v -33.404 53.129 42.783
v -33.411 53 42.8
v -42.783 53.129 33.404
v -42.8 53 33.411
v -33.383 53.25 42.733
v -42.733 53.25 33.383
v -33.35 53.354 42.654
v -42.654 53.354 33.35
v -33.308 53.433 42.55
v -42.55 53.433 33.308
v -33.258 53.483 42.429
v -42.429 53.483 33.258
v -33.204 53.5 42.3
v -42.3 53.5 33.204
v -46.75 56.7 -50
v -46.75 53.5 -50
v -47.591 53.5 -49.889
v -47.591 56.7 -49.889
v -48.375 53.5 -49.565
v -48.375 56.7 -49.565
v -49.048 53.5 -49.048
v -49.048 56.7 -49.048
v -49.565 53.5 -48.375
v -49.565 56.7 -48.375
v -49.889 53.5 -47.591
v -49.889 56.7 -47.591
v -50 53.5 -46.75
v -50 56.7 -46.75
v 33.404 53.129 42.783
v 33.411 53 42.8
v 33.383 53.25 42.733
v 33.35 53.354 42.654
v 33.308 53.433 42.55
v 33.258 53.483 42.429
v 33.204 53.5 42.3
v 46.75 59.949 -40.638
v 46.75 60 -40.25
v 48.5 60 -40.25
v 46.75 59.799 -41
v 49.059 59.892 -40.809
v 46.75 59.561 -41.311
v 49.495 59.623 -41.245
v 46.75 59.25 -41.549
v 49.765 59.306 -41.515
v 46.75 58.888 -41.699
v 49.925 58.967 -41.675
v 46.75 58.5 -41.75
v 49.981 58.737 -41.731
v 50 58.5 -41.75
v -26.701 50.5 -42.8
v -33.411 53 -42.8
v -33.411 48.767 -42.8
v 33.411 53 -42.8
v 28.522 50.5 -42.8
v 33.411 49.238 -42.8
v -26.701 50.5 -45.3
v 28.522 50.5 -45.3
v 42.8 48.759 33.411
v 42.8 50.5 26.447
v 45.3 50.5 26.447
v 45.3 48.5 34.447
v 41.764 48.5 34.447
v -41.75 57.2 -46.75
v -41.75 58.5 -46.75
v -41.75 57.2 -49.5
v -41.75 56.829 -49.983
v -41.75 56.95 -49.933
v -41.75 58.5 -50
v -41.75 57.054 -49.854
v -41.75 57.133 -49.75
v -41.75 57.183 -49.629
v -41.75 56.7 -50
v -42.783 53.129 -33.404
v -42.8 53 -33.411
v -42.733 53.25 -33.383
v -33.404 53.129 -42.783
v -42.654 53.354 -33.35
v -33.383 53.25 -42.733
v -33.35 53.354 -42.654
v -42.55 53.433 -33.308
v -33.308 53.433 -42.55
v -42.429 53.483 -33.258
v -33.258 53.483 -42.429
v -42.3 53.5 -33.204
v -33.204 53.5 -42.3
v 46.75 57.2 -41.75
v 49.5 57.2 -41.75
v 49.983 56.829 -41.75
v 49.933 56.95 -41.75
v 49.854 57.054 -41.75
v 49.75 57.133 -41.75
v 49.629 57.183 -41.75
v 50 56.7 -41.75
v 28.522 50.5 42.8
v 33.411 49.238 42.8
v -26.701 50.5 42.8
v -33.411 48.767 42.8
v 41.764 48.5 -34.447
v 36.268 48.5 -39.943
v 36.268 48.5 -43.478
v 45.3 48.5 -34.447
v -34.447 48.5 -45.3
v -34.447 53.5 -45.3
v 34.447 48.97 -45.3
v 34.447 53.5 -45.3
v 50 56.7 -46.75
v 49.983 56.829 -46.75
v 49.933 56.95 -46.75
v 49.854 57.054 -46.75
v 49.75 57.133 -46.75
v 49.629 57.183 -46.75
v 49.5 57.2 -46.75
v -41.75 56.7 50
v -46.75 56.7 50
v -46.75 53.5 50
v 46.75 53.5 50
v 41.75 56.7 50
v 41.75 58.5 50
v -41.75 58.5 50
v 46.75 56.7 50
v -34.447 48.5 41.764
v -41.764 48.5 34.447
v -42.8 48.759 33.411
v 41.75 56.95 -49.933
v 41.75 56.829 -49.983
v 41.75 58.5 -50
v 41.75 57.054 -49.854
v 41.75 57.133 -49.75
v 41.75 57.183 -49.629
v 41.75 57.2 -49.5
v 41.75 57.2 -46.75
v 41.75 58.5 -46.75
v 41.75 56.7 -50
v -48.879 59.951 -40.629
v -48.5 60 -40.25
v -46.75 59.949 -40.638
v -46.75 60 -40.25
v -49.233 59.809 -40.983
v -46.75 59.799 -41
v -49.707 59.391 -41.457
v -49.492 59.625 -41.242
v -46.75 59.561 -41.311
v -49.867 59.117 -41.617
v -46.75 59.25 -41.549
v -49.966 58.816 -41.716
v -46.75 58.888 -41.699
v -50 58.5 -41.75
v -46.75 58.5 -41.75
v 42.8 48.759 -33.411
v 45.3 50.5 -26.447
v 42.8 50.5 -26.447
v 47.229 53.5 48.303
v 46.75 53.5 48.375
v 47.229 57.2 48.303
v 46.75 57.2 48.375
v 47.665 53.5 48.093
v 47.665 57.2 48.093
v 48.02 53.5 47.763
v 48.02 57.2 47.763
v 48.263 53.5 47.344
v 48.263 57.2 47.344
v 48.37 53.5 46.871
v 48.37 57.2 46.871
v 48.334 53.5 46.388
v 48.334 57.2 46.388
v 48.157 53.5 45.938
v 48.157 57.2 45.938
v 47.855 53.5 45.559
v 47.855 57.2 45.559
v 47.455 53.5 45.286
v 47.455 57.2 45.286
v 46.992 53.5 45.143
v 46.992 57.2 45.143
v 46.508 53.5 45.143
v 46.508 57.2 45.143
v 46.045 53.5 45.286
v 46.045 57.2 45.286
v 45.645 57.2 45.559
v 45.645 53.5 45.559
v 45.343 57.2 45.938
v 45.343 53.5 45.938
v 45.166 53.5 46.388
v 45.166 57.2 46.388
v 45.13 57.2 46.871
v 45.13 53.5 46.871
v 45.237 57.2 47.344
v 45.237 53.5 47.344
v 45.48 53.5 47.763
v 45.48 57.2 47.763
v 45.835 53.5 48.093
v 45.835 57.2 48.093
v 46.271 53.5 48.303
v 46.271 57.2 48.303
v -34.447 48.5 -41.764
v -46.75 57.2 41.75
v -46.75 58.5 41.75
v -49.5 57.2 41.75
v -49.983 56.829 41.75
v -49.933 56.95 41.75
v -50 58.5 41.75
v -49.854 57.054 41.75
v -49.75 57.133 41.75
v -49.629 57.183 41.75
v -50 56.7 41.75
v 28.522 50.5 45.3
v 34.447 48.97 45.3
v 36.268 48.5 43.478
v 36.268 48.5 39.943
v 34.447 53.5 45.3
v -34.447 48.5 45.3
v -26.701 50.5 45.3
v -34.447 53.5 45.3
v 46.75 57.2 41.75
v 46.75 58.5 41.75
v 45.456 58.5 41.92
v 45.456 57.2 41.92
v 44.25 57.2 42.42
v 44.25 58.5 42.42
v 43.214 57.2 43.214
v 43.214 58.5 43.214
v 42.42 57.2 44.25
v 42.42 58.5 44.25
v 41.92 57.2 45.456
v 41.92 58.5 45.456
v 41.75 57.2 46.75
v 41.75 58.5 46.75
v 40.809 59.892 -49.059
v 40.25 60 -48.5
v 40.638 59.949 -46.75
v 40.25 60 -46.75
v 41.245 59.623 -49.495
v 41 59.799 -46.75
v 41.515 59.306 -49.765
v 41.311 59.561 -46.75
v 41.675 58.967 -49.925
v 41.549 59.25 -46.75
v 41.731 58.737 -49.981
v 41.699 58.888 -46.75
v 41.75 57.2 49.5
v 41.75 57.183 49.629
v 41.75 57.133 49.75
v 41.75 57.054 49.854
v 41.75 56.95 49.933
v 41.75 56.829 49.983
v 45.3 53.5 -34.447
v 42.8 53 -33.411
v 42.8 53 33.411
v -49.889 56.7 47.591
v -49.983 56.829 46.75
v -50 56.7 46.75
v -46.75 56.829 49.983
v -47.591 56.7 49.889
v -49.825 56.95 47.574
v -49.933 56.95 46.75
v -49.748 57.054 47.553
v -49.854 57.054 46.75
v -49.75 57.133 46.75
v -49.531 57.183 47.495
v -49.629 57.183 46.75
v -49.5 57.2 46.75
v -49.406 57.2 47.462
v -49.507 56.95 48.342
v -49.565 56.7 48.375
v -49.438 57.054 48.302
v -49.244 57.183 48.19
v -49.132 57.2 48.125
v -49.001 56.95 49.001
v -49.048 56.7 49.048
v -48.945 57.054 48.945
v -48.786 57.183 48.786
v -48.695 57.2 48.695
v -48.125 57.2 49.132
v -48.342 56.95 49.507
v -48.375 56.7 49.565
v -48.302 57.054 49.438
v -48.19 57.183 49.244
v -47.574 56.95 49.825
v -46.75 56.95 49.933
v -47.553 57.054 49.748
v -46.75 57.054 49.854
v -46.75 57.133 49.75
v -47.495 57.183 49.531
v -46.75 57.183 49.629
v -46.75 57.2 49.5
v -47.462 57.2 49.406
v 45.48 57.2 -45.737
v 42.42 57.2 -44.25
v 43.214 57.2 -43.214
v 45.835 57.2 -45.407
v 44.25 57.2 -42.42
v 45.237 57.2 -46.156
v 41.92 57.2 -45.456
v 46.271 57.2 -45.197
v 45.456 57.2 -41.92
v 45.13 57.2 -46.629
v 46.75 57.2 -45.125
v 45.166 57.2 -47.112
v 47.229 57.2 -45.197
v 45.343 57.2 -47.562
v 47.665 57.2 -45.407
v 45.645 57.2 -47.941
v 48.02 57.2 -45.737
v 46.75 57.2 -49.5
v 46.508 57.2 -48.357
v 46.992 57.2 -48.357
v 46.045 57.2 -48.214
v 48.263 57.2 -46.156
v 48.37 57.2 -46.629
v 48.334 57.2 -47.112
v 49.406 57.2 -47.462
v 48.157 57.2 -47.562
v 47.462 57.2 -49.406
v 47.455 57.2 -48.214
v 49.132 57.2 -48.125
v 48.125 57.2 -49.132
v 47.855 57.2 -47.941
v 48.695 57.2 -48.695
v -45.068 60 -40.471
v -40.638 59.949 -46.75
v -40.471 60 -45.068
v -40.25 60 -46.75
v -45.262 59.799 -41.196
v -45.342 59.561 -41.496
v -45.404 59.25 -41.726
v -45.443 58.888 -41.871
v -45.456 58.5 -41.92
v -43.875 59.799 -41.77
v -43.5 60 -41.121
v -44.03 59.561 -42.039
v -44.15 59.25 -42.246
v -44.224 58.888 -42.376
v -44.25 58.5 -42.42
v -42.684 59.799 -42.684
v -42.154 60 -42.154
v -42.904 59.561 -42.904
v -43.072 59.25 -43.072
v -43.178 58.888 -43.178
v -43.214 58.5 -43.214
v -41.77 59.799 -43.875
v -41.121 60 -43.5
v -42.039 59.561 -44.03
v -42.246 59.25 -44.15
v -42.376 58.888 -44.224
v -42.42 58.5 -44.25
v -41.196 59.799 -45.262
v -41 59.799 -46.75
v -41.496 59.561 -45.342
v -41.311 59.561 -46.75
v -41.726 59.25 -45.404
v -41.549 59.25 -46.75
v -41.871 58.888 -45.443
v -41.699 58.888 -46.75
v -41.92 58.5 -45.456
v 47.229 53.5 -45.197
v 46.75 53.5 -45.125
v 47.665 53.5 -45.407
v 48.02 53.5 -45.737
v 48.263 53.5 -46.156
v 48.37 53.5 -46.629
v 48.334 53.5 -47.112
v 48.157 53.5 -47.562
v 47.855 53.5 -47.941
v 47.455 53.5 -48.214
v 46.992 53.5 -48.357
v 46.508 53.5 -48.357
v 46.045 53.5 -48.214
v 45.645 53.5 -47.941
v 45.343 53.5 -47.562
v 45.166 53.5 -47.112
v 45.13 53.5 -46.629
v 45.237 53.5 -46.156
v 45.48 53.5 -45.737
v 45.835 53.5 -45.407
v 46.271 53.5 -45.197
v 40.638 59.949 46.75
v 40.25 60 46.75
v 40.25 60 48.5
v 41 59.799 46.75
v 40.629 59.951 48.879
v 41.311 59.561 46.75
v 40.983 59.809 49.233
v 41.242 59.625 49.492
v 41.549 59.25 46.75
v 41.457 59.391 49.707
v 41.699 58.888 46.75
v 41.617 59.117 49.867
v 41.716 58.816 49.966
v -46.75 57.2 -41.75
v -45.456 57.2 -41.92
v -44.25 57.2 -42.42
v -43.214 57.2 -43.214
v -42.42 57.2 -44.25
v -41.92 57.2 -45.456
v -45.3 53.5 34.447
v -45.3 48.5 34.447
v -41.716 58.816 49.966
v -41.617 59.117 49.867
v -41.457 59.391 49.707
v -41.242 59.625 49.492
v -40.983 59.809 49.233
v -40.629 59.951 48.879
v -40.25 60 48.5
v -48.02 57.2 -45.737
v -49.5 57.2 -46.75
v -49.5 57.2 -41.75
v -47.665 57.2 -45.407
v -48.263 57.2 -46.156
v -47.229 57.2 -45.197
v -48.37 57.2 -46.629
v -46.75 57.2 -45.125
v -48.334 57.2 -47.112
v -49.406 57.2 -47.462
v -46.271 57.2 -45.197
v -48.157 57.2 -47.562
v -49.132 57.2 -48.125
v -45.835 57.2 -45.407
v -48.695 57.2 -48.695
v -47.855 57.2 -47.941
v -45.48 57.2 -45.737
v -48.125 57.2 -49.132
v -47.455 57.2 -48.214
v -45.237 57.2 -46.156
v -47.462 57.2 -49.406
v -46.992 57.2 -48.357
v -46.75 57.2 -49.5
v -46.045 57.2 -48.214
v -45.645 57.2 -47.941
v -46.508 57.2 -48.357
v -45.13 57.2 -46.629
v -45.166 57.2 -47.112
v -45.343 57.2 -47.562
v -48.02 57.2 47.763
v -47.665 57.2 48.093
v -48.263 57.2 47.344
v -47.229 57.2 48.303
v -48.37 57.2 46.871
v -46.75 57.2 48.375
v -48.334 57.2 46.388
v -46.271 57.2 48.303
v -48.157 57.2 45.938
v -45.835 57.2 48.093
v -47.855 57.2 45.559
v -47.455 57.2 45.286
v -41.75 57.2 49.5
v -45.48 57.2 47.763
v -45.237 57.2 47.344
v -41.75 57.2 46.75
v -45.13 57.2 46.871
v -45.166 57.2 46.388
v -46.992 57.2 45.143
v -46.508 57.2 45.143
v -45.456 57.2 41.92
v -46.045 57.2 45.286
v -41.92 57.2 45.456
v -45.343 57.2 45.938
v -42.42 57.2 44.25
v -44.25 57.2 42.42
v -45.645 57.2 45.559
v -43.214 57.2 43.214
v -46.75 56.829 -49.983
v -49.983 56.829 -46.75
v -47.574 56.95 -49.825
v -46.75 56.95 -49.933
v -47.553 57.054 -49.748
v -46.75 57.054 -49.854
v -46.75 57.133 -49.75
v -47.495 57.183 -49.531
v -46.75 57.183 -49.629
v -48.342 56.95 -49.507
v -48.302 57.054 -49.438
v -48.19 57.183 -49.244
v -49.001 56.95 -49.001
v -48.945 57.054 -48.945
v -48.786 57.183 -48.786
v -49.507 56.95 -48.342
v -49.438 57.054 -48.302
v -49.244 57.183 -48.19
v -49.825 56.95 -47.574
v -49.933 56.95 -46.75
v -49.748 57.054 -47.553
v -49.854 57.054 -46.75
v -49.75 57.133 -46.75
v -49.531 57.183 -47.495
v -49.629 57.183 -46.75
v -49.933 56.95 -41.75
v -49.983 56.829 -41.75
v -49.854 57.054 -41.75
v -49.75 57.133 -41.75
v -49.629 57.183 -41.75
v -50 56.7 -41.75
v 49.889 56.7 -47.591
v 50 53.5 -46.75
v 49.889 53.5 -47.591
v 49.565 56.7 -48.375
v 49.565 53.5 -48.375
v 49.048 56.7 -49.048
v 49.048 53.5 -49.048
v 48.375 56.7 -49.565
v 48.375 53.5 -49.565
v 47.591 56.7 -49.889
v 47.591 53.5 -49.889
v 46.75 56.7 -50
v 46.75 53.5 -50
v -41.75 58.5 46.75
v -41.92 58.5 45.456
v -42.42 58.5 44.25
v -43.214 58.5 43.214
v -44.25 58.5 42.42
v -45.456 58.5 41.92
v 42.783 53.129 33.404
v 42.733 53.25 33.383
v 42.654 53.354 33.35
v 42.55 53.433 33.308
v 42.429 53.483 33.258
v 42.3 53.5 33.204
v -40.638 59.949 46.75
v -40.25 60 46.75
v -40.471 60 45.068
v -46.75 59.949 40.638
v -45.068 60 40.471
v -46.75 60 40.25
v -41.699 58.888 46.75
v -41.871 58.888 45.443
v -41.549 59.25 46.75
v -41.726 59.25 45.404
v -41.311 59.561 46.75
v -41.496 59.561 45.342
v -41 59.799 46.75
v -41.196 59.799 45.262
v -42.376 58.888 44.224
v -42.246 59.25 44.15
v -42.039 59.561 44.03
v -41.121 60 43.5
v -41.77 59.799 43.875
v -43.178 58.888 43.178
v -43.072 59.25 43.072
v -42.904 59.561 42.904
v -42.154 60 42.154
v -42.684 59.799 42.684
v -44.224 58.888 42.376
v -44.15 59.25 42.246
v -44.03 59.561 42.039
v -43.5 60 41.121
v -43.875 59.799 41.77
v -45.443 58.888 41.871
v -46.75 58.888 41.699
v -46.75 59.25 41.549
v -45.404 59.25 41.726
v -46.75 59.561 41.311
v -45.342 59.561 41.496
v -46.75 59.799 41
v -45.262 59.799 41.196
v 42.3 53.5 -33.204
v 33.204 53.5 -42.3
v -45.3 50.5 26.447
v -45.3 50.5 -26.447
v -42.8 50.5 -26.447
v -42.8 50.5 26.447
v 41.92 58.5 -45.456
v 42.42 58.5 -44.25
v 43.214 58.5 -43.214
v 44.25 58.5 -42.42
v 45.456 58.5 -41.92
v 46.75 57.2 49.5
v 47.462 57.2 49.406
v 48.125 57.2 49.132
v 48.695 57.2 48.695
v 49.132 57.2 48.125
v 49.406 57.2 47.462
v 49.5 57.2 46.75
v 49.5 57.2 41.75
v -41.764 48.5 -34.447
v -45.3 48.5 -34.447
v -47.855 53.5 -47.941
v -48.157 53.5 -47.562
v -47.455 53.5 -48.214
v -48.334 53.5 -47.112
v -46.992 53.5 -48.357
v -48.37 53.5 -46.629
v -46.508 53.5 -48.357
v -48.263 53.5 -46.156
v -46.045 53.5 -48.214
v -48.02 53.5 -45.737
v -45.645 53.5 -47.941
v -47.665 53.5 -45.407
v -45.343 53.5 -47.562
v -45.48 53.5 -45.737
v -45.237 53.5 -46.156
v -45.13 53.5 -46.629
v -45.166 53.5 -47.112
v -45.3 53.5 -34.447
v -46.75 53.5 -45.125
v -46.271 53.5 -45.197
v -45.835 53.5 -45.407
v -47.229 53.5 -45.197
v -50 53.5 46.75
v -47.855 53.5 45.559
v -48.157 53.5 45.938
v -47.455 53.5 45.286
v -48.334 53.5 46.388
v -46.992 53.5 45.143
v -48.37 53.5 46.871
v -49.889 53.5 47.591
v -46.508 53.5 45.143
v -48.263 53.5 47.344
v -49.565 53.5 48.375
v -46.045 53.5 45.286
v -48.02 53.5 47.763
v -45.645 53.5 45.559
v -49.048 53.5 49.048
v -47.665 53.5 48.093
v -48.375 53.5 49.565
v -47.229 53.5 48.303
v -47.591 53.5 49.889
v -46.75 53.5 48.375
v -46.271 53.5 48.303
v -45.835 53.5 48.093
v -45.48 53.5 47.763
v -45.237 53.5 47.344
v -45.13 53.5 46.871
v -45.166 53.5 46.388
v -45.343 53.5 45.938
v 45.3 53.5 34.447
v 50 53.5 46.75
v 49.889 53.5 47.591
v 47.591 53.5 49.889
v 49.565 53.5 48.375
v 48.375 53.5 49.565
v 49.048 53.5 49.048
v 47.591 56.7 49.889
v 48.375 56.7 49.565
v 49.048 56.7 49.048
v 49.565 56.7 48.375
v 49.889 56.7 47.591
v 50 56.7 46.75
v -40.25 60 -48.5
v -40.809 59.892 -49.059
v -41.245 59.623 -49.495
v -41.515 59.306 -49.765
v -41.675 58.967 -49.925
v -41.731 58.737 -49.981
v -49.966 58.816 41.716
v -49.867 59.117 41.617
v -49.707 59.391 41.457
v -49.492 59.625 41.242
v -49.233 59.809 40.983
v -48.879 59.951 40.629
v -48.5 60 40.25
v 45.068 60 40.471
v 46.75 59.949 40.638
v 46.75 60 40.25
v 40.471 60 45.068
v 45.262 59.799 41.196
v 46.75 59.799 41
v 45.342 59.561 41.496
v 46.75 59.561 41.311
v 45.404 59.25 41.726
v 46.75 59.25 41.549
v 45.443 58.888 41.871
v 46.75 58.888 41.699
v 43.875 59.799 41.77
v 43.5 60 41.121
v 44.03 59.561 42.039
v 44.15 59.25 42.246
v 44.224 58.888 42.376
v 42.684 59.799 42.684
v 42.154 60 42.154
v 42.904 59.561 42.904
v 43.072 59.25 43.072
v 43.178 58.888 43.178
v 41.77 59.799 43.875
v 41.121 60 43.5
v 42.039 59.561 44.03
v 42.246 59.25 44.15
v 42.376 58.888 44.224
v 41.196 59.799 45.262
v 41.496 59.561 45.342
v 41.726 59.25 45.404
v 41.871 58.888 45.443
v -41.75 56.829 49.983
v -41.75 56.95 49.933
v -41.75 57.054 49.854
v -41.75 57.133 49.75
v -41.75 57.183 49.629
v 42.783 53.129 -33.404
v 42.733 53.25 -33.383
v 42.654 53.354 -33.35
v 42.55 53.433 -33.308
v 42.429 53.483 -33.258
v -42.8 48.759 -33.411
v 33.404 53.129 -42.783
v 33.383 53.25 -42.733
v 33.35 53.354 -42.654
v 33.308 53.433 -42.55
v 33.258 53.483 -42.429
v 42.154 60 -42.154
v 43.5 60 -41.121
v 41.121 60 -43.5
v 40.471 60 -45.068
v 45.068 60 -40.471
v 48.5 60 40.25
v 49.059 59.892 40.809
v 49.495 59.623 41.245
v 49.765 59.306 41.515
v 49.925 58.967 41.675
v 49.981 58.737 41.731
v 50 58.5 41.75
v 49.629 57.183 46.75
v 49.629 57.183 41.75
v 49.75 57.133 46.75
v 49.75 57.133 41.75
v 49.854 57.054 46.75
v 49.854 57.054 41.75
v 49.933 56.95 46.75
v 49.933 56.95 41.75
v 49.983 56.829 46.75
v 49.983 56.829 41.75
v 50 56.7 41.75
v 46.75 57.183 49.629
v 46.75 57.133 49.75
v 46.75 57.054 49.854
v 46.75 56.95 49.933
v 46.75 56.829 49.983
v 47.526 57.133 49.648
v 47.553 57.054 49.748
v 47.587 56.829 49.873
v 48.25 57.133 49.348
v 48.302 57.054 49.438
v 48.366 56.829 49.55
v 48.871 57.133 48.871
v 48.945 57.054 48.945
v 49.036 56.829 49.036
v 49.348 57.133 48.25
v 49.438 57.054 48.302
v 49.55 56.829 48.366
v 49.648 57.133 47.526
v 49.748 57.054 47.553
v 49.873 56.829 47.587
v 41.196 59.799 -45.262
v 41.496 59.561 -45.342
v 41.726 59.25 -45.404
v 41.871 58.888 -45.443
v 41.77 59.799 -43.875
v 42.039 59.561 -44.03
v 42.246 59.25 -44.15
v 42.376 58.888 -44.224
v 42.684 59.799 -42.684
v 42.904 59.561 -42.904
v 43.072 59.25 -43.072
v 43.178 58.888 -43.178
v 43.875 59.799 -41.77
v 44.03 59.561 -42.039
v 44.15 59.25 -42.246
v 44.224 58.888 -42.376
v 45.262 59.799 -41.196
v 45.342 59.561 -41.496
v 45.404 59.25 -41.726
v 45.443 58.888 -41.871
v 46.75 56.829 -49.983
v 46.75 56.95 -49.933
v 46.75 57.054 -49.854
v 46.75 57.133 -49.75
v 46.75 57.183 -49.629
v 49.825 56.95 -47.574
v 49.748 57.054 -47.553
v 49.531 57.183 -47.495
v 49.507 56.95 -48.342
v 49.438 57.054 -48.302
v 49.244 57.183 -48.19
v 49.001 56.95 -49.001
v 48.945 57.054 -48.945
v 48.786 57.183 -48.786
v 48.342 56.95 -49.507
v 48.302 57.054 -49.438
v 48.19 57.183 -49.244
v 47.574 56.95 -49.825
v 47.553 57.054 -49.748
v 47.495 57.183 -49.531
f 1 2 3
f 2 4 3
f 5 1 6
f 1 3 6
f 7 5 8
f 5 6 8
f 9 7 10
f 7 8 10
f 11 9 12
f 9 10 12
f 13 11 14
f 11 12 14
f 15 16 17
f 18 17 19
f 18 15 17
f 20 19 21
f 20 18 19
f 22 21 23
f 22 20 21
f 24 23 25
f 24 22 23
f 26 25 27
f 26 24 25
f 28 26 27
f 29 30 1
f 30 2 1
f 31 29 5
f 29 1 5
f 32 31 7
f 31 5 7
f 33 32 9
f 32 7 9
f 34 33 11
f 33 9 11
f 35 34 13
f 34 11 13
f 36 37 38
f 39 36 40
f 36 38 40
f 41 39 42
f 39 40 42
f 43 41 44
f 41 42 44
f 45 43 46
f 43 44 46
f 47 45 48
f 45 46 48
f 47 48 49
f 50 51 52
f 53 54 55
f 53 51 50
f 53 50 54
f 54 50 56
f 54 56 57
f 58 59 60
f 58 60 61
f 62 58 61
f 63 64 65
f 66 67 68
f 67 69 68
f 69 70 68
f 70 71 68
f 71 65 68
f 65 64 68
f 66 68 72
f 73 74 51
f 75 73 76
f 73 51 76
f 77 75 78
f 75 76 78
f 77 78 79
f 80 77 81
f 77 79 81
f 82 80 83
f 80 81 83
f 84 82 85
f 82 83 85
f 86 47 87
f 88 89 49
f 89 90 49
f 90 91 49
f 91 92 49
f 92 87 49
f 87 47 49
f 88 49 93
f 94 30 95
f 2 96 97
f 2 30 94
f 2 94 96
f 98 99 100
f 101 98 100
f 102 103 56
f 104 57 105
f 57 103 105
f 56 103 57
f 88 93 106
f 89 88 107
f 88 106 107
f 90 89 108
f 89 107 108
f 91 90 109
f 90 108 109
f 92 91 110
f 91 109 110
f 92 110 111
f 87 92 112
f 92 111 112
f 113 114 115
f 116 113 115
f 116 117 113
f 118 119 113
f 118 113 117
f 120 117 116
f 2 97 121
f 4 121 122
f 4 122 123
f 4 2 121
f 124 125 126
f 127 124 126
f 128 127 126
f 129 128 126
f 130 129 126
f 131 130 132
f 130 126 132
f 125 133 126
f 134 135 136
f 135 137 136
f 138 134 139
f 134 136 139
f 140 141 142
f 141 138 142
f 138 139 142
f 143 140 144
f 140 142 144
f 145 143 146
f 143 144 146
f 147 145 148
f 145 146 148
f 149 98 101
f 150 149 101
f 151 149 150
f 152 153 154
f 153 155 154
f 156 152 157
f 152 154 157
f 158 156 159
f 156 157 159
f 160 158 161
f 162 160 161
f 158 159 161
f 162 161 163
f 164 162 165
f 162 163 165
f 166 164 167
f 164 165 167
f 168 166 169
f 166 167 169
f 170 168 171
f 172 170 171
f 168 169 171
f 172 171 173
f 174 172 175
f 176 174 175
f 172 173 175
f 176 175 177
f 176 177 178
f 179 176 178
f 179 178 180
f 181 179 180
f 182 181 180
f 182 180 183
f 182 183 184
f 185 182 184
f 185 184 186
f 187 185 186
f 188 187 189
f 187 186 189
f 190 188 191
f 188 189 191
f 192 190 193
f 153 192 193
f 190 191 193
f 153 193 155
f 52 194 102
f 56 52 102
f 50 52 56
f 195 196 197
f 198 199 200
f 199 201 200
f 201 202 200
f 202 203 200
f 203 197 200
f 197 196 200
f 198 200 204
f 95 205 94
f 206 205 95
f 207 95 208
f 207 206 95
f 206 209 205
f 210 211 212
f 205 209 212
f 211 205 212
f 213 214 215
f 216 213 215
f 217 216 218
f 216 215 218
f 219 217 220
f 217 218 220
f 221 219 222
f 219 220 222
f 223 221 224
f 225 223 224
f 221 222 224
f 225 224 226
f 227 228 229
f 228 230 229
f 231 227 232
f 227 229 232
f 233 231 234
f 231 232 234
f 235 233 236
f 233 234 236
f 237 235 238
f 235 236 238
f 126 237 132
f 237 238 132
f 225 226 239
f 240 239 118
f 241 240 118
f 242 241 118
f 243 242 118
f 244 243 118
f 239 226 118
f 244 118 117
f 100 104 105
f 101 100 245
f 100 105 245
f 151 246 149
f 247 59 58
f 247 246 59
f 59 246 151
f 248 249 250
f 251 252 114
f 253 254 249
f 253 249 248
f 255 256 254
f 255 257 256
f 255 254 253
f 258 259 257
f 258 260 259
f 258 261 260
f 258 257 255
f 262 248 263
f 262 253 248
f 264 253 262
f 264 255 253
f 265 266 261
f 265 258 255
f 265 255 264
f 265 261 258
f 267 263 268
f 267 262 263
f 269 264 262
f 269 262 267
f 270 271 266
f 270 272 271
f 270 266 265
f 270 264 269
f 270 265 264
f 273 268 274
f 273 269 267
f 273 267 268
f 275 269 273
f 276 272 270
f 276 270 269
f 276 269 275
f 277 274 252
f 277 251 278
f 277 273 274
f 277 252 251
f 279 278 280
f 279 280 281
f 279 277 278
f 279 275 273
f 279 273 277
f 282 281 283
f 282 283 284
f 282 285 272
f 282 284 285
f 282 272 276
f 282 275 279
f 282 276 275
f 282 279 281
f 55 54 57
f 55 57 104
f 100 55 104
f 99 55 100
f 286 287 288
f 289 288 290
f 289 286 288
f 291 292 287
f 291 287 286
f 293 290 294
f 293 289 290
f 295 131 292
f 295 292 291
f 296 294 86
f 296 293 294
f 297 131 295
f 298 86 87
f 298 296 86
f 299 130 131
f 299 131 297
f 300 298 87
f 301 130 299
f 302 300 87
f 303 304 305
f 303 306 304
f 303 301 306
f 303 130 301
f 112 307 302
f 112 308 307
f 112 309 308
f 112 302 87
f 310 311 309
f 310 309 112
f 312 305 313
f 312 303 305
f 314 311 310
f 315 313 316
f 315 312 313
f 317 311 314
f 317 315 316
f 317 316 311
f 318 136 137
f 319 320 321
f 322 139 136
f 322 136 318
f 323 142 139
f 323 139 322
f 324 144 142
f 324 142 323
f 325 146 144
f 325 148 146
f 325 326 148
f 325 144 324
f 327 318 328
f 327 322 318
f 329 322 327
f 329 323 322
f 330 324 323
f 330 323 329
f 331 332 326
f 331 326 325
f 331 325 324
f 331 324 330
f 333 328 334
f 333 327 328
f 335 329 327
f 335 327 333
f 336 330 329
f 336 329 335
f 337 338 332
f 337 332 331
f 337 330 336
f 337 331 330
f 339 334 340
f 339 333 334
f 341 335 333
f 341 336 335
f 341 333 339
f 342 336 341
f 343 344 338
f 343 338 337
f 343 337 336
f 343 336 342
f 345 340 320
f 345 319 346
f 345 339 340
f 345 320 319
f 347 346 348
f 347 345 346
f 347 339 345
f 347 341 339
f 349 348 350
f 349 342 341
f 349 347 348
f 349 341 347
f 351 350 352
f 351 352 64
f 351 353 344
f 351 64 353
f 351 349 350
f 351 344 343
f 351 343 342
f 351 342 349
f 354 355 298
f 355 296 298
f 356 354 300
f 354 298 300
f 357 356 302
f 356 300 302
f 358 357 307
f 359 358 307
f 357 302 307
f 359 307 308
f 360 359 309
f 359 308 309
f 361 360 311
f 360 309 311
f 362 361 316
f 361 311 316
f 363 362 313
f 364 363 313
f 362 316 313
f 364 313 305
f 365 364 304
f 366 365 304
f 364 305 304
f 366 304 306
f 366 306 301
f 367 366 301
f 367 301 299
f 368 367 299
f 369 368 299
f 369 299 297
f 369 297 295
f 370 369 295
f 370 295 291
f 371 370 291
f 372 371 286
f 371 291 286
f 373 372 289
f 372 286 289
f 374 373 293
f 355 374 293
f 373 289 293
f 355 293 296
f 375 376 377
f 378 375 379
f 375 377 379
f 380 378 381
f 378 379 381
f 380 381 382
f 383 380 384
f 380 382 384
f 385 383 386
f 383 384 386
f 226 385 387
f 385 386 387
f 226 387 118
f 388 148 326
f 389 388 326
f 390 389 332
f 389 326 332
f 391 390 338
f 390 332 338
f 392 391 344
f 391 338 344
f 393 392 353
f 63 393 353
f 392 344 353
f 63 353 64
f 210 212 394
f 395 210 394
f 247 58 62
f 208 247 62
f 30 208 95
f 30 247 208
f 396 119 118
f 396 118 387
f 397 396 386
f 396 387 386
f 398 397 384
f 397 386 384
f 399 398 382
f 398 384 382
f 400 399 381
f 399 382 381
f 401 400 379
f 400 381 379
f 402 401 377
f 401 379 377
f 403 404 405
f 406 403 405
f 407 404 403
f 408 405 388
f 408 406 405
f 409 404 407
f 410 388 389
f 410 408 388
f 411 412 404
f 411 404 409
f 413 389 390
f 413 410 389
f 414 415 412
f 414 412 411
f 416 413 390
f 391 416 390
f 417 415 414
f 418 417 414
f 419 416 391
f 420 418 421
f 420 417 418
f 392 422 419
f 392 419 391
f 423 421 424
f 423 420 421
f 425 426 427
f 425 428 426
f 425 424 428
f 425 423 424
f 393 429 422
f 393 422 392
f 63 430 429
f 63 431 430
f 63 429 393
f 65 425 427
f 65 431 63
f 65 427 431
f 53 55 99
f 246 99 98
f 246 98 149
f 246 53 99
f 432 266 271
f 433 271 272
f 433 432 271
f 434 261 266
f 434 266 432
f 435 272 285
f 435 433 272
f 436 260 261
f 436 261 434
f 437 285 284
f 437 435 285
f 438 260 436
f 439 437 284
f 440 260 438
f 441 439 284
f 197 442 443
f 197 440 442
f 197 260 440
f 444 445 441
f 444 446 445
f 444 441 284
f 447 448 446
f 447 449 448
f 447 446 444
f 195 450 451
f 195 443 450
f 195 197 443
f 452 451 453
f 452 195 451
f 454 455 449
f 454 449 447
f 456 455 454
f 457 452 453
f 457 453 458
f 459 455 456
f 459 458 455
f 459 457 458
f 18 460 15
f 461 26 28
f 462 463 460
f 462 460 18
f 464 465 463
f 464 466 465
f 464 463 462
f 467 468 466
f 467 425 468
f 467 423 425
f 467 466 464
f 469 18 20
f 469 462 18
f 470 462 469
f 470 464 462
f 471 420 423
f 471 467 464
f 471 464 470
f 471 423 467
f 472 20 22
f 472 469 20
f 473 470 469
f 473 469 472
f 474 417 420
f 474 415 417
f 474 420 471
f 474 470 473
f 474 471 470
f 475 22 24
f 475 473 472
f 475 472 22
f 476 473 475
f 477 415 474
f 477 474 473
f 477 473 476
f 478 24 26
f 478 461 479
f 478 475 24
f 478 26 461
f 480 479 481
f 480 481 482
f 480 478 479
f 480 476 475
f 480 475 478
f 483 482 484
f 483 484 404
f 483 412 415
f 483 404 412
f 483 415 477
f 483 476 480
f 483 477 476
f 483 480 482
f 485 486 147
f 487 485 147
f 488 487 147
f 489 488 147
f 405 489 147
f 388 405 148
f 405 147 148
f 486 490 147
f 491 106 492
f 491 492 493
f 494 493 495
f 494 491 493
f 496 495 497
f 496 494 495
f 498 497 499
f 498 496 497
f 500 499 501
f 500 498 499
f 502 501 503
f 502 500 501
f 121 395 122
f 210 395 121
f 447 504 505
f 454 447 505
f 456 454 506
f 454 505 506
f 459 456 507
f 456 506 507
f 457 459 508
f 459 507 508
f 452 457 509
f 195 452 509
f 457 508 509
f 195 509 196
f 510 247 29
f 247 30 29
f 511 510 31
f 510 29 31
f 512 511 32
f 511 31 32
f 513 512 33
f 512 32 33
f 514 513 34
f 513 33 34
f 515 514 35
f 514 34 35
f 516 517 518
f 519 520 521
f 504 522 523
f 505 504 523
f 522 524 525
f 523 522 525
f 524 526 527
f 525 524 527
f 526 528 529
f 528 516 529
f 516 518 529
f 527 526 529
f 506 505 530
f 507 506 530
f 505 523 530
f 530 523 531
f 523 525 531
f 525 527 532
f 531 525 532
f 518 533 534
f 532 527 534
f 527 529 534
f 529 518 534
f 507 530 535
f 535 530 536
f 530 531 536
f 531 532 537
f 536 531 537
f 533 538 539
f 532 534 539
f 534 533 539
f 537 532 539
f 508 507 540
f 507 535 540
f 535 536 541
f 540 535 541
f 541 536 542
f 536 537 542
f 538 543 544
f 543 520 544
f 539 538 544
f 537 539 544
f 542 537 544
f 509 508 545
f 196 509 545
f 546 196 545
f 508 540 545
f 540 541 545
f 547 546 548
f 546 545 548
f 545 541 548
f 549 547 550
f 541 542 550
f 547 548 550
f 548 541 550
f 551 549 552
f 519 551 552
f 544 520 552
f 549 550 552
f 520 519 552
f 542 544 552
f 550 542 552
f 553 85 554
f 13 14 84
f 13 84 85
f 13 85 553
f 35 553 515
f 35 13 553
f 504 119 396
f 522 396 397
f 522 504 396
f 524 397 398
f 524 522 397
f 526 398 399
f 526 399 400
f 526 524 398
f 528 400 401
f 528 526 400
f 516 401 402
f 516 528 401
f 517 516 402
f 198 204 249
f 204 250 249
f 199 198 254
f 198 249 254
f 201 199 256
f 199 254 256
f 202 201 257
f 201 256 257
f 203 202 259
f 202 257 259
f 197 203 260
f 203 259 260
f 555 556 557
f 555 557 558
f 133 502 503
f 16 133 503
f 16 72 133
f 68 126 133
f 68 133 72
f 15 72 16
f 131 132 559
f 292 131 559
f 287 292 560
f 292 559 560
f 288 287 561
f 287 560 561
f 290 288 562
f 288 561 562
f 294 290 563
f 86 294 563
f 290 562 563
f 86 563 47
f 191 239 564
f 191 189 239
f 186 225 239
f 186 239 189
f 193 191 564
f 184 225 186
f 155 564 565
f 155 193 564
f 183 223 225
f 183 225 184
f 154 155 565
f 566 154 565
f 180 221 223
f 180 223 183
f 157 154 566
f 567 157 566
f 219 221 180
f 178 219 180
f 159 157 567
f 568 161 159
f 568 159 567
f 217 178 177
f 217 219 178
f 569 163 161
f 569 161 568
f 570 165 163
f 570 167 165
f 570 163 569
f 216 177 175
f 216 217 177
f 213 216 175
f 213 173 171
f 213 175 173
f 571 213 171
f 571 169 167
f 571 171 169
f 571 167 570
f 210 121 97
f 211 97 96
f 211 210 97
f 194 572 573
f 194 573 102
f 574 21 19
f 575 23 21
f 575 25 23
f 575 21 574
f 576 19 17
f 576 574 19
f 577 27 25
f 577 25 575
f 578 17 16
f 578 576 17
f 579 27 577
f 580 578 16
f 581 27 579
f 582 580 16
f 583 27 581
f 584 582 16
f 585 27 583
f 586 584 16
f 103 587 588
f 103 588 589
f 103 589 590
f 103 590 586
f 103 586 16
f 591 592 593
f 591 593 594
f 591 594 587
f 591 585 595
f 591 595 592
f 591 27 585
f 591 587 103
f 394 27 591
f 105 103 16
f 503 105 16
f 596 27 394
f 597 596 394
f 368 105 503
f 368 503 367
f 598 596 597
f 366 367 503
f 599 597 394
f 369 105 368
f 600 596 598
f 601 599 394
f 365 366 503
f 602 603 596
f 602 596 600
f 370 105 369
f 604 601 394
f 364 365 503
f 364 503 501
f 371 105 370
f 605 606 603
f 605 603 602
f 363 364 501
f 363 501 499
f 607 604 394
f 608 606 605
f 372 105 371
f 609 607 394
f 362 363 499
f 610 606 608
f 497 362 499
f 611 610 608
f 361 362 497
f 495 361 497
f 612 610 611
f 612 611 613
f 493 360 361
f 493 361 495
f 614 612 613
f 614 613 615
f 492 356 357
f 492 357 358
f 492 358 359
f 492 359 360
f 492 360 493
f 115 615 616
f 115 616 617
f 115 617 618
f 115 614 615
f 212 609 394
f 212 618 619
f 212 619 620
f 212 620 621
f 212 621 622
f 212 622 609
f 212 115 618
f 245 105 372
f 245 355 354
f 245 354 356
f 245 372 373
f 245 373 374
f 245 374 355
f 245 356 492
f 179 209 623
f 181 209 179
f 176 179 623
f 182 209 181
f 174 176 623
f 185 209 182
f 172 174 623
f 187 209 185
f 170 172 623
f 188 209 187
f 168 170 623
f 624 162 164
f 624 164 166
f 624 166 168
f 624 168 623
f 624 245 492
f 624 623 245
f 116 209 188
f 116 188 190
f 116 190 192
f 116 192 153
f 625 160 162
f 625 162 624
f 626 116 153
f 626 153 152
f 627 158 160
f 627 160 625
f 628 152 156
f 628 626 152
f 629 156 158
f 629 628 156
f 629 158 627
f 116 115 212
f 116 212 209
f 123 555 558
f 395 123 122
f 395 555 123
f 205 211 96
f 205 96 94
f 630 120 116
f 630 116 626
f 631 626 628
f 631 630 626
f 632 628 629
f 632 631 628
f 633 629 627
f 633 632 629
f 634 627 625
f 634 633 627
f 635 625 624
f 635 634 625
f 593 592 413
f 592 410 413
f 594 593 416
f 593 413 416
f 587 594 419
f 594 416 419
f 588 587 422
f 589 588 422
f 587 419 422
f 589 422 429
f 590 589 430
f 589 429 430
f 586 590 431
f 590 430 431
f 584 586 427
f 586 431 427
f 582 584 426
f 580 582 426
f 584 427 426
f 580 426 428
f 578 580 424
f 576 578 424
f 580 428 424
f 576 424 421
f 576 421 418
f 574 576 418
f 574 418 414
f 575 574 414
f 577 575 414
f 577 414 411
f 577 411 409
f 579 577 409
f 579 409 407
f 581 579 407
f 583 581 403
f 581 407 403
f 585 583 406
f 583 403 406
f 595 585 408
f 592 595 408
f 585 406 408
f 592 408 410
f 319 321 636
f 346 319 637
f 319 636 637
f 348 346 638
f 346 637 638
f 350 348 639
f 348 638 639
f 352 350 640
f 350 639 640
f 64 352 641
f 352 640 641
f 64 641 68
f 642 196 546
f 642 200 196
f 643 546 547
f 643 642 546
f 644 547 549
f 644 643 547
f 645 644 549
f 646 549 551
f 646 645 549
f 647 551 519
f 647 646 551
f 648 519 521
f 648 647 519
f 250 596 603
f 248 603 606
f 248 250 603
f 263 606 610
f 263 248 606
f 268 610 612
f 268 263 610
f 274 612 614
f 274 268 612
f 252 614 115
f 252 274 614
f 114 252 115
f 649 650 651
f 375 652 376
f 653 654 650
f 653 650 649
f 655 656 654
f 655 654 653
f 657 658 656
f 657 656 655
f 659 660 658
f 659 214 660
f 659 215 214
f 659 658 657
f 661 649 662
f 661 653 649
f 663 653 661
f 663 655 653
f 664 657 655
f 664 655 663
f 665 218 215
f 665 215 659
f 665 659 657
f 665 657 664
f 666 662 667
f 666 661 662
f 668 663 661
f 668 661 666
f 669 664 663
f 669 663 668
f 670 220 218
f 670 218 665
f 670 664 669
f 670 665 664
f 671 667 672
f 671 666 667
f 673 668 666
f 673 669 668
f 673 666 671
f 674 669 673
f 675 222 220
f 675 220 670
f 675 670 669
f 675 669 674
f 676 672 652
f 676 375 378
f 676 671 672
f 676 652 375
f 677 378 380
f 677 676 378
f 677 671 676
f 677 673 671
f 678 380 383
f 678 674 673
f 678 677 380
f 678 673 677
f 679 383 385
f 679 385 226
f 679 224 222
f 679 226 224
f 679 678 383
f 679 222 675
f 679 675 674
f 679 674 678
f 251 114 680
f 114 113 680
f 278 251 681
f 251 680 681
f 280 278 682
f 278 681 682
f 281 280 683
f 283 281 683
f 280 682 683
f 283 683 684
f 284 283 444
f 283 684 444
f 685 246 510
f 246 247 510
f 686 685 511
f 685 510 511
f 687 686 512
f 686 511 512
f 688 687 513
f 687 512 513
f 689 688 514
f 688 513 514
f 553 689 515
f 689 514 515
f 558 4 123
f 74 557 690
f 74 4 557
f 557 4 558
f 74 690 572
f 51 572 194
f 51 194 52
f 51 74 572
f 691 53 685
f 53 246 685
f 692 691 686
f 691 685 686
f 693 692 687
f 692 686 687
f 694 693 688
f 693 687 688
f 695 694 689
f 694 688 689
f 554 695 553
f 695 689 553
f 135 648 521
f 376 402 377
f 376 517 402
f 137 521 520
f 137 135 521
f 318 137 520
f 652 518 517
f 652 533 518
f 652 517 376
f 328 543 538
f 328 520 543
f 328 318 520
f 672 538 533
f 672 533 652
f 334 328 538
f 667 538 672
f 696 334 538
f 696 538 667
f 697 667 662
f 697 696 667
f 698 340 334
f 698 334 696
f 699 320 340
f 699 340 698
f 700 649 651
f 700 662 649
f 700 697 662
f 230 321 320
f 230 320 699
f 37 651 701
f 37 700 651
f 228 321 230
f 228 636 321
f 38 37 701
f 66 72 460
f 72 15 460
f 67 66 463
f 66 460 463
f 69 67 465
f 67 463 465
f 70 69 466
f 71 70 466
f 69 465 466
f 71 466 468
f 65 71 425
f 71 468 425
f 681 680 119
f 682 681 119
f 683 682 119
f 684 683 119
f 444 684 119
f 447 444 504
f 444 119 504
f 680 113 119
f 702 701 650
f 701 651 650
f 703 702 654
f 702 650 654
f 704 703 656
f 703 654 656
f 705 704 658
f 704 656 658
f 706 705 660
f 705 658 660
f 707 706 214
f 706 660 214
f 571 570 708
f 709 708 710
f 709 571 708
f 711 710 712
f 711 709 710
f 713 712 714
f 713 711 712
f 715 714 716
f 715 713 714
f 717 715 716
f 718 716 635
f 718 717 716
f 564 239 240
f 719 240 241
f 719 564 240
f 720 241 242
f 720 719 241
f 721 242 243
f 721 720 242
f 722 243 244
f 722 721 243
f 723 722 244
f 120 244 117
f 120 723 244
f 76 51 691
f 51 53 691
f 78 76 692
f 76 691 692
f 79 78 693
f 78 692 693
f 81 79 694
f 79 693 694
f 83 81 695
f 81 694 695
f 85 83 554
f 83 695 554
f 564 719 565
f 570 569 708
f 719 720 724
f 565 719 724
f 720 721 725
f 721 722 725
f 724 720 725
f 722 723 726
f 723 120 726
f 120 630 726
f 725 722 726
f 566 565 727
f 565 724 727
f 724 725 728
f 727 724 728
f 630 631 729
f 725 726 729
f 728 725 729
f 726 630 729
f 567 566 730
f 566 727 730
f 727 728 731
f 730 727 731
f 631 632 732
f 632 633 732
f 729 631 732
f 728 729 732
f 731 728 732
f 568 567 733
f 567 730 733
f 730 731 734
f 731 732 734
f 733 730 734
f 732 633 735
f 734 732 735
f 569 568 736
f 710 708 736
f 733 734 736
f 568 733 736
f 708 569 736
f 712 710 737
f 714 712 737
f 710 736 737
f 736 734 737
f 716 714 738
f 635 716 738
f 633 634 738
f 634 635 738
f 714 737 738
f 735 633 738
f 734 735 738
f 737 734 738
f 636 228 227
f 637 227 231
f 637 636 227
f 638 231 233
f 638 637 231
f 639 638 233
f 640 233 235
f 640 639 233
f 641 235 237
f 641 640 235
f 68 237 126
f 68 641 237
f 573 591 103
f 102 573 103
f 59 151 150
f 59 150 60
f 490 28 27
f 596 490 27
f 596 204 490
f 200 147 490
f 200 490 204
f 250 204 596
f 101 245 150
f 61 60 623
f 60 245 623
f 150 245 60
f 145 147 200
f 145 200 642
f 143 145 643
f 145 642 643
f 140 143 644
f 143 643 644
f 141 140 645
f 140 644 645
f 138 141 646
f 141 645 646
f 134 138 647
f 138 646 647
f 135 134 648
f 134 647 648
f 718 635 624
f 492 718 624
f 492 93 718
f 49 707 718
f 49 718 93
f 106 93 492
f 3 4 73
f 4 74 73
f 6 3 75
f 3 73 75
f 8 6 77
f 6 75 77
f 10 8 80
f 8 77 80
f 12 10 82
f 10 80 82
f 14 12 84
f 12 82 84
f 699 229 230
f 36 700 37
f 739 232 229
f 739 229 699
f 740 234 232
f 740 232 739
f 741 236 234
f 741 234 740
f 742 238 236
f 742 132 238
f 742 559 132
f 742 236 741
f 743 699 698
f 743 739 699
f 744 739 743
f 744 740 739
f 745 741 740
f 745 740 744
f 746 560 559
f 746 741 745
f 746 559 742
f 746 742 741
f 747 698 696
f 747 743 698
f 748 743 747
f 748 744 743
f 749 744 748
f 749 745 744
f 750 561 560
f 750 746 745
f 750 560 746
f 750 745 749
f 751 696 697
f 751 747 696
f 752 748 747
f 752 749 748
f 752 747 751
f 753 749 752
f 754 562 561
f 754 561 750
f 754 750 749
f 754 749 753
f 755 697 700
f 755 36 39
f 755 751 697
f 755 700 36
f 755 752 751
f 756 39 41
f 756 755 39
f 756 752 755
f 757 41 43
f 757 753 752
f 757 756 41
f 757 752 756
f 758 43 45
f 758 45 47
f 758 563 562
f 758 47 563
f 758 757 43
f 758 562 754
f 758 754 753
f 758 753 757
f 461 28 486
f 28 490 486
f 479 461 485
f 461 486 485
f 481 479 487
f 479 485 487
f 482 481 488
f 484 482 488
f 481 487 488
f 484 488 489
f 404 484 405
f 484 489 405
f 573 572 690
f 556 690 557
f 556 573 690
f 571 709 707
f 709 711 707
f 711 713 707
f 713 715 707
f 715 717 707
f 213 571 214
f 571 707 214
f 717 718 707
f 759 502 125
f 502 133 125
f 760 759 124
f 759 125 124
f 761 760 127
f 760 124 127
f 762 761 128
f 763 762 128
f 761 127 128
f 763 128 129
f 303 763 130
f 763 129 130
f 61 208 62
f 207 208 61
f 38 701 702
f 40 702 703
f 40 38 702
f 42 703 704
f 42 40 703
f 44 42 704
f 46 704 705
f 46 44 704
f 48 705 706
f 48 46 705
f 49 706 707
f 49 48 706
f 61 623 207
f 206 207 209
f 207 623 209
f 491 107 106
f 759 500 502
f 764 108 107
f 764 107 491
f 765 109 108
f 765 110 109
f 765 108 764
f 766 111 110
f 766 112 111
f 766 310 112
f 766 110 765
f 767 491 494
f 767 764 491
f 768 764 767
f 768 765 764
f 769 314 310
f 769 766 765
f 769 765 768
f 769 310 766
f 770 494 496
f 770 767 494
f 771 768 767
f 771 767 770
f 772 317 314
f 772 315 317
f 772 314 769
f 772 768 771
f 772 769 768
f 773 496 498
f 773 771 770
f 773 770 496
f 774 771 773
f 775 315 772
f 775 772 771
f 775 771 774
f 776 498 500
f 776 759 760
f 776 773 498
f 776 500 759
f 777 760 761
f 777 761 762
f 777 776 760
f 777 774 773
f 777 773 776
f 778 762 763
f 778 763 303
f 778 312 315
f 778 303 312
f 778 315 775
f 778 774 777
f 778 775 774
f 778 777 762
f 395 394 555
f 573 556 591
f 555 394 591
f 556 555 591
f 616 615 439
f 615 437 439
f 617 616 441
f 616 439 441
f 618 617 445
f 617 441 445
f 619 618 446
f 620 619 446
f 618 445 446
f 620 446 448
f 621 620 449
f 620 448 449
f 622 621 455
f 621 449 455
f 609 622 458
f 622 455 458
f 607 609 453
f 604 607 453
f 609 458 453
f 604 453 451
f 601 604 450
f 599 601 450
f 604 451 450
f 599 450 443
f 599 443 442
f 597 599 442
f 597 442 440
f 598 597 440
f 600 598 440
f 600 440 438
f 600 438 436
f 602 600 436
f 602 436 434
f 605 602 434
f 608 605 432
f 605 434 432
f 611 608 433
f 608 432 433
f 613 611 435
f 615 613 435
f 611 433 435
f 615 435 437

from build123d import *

# Parameters (mm, degrees)
SKETCH1_W           = 100
SKETCH1_H           = 100
BOSS_EXTRUDE1_DEPTH = 53.5
SKETCH2_R           = 2.5
SKETCH2_W           = 12.6
SKETCH2_H           = 3.072407599
BOSS_EXTRUDE2_DEPTH = 4
CUT_EXTRUDE1_DEPTH  = 47.5
FILLET1_R           = 3.25
FILLET2_R           = 3
SKETCH4_R           = 1.625
CUT_EXTRUDE2_DEPTH  = 14
FILLET3_R           = 3
BOSS_EXTRUDE3_START = 6.5
SKETCH8_R           = 1.625
BOSS_EXTRUDE3_DEPTH = 6.5
SKETCH10_W          = 159.412029064
SKETCH10_H          = 131.965012122
CUT_EXTRUDE3_DEPTH  = 205.5
SKETCH11_R          = 1.625
CUT_EXTRUDE4_DEPTH  = 2.8
FILLET4_R           = 1.5
FILLET5_R           = 0.5
BOSS_EXTRUDE4_DEPTH = 5
FILLET6_R           = 0.5
CUT_EXTRUDE5_DEPTH  = 130
CUT_EXTRUDE6_DEPTH  = 130


with BuildPart() as part:
    # Sketch1 → Boss-Extrude1 (new body)
    with BuildSketch(Plane(origin=(0, 0, 0), x_dir=(1, 0, 0), z_dir=(0, 1, 0))):
        Rectangle(SKETCH1_W, SKETCH1_H)
    extrude(amount=BOSS_EXTRUDE1_DEPTH)

    # Sketch2 → Boss-Extrude2 (add)
    # profile 1 of 8: a face of its own
    with BuildSketch(Plane.XZ):
        with BuildLine():
            Line((33.15, -50), (20.55, -50))
            Line((20.55, -50), (20.55, -56.973787721))
            ThreePointArc((20.55, -56.973787721), (26.85, -63.273787721), (33.15, -56.973787721))
            Line((33.15, -56.973787721), (33.15, -50))
        make_face()
        with Locations(Location((26.85, -56.973787721, 0), (0, 0, 270))):
            Circle(SKETCH2_R, mode=Mode.SUBTRACT)
    # profile 2 of 8: a face of its own
    with BuildSketch(Plane.XZ):
        with BuildLine():
            Line((-20.55, -56.973787721), (-20.55, -50))
            Line((-20.55, -50), (-33.15, -50))
            Line((-33.15, -50), (-33.15, -56.973787721))
            ThreePointArc((-33.15, -56.973787721), (-26.85, -63.273787721), (-20.55, -56.973787721))
        make_face()
        with Locations(Location((-26.85, -56.973787721, 0), (0, 0, 270))):
            Circle(SKETCH2_R, mode=Mode.SUBTRACT)
    # profile 3 of 8: a face of its own
    with BuildSketch(Plane.XZ):
        with Locations((-26.85, 48.4637962)):
            Rectangle(SKETCH2_W, SKETCH2_H)
    # profile 4 of 8: a face of its own
    with BuildSketch(Plane.XZ):
        with BuildLine():
            Line((-33.15, 50), (-20.55, 50))
            Line((-20.55, 50), (-20.55, 56.973787721))
            ThreePointArc((-20.55, 56.973787721), (-26.85, 63.273787721), (-33.15, 56.973787721))
            Line((-33.15, 56.973787721), (-33.15, 50))
        make_face()
        with Locations(Location((-26.85, 56.973787721, 0), (0, 0, 270))):
            Circle(SKETCH2_R, mode=Mode.SUBTRACT)
    # profile 5 of 8: a face of its own
    with BuildSketch(Plane.XZ):
        with BuildLine():
            Line((20.55, 56.973787721), (20.55, 50))
            Line((20.55, 50), (33.15, 50))
            Line((33.15, 50), (33.15, 56.973787721))
            ThreePointArc((33.15, 56.973787721), (26.85, 63.273787721), (20.55, 56.973787721))
        make_face()
        with Locations(Location((26.85, 56.973787721, 0), (0, 0, 270))):
            Circle(SKETCH2_R, mode=Mode.SUBTRACT)
    # profile 6 of 8: a face of its own
    with BuildSketch(Plane.XZ):
        with Locations((26.85, 48.4637962)):
            Rectangle(SKETCH2_W, SKETCH2_H)
    # profile 7 of 8: a face of its own
    with BuildSketch(Plane.XZ):
        with Locations((26.85, -48.4637962)):
            Rectangle(SKETCH2_W, SKETCH2_H)
    # profile 8 of 8: a face of its own
    with BuildSketch(Plane.XZ):
        with Locations((-26.85, -48.4637962)):
            Rectangle(SKETCH2_W, SKETCH2_H)
    extrude(amount=-BOSS_EXTRUDE2_DEPTH)

    # Sketch3 → Cut-Extrude1 (cut)
    with BuildSketch(Plane(origin=(0, 53.5, 0), x_dir=(1, 0, 0), z_dir=(0, 1, 0))):
        Polygon((35.565, 48), (-35.565, 48), (-48, 35.565), (-48, -35.565), (-35.565, -48), (35.565, -48), (48, -35.565), (48, 35.565), align=None)
    extrude(amount=-CUT_EXTRUDE1_DEPTH, mode=Mode.SUBTRACT)

    # Fillet1
    fillet1_edges = [part.edges().sort_by_distance(p)[0] for p in [
        (50, 26.75, 50),
        (-50, 26.75, 50),
        (-50, 26.75, -50),
        (50, 26.75, -50),
    ]]
    fillet(fillet1_edges, radius=FILLET1_R)

    # Fillet2
    fillet2_edges = [part.edges().sort_by_distance(p)[0] for p in [
        (-26.85, 4, 50),
        (26.85, 4, 50),
        (26.85, 4, -50),
        (-26.85, 4, -50),
    ]]
    fillet(fillet2_edges, radius=FILLET2_R)

    # Sketch4 → Cut-Extrude2 (cut)
    with BuildSketch(Plane(origin=(0, 53.5, 0), x_dir=(1, 0, 0), z_dir=(0, 1, 0))):
        with Locations(Location((-46.75, 46.75, 0), (0, 0, 270))):
            Circle(SKETCH4_R)
        with Locations(Location((46.75, 46.75, 0), (0, 0, 270))):
            Circle(SKETCH4_R)
        with Locations(Location((46.75, -46.75, 0), (0, 0, 270))):
            Circle(SKETCH4_R)
        with Locations(Location((-46.75, -46.75, 0), (0, 0, 270))):
            Circle(SKETCH4_R)
    extrude(amount=-CUT_EXTRUDE2_DEPTH, mode=Mode.SUBTRACT)

    # Fillet3
    fillet3_edges = [part.edges().sort_by_distance(p)[0] for p in [
        (50, 0, 0),
        (39.95, 0, -50),
        (-39.95, 0, 50),
        (-50, 0, 0),
        (49.048097039, 0, -49.048097039),
        (-49.048097039, 0, -49.048097039),
        (-49.048097039, 0, 49.048097039),
        (49.048097039, 0, 49.048097039),
        (0, 0, 50),
        (39.95, 0, 50),
        (0, 0, -50),
        (-39.95, 0, -50),
    ]]
    fillet(fillet3_edges, radius=FILLET3_R)

    # Sketch8 → Boss-Extrude3 (add)
    # profile 1 of 2: a face of its own
    with BuildSketch(Plane(origin=(0, 53.5, 0), x_dir=(1, 0, 0), z_dir=(0, 1, 0)).offset(BOSS_EXTRUDE3_START)):
        with BuildLine():
            ThreePointArc((-50, -46.75), (-49.048097039, -49.048097039), (-46.75, -50))
            Line((-46.75, -50), (46.75, -50))
            ThreePointArc((46.75, -50), (49.048097039, -49.048097039), (50, -46.75))
            Line((50, -46.75), (50, 46.75))
            ThreePointArc((50, 46.75), (49.048097039, 49.048097039), (46.75, 50))
            Line((46.75, 50), (-46.75, 50))
            ThreePointArc((-46.75, 50), (-49.048097039, 49.048097039), (-50, 46.75))
            Line((-50, 46.75), (-50, -46.75))
        make_face()
        with Locations(Location((-46.75, 46.75, 0), (0, 0, 270))):
            Circle(SKETCH8_R, mode=Mode.SUBTRACT)
        with Locations(Location((46.75, 46.75, 0), (0, 0, 270))):
            Circle(SKETCH8_R, mode=Mode.SUBTRACT)
        with Locations(Location((-46.75, -46.75, 0), (0, 0, 270))):
            Circle(SKETCH8_R, mode=Mode.SUBTRACT)
        with Locations(Location((46.75, -46.75, 0), (0, 0, 270))):
            Circle(SKETCH8_R, mode=Mode.SUBTRACT)
        Polygon((-35.565, 48), (35.565, 48), (48, 35.565), (48, -35.565), (35.565, -48), (-35.565, -48), (-48, -35.565), (-48, 35.565), align=None, mode=Mode.SUBTRACT)
    # profile 2 of 2: a face of its own
    with BuildSketch(Plane(origin=(0, 53.5, 0), x_dir=(1, 0, 0), z_dir=(0, 1, 0)).offset(BOSS_EXTRUDE3_START)):
        Polygon((35.565, 48), (48, 35.565), (48, -35.565), (35.565, -48), (-35.565, -48), (-48, -35.565), (-48, 35.565), (-35.565, 48), align=None)
    extrude(amount=-BOSS_EXTRUDE3_DEPTH)

    # Sketch10 → Cut-Extrude3 (cut)
    with BuildSketch(Plane.XZ.offset(-53.5)):
        Rectangle(SKETCH10_W, SKETCH10_H)
    extrude(amount=CUT_EXTRUDE3_DEPTH, mode=Mode.SUBTRACT)

    # Sketch11 → Cut-Extrude4 (cut)
    # profile 1 of 4: a face of its own
    with BuildSketch(Plane(origin=(0, 60, 0), x_dir=(1, 0, 0), z_dir=(0, 1, 0))):
        with BuildLine():
            Line((-46.75, -41.75), (-50, -41.75))
            Line((-50, -41.75), (-50, -46.75))
            ThreePointArc((-50, -46.75), (-49.048097039, -49.048097039), (-46.75, -50))
            Line((-46.75, -50), (-41.75, -50))
            Line((-41.75, -50), (-41.75, -46.75))
            ThreePointArc((-41.75, -46.75), (-43.214466094, -43.214466094), (-46.75, -41.75))
        make_face()
        with Locations(Location((-46.75, -46.75, 0), (0, 0, 270))):
            Circle(SKETCH11_R, mode=Mode.SUBTRACT)
    # profile 2 of 4: a face of its own
    with BuildSketch(Plane(origin=(0, 60, 0), x_dir=(1, 0, 0), z_dir=(0, 1, 0))):
        with BuildLine():
            Line((-50, 41.75), (-46.75, 41.75))
            ThreePointArc((-46.75, 41.75), (-43.214466094, 43.214466094), (-41.75, 46.75))
            Line((-41.75, 46.75), (-41.75, 50))
            Line((-41.75, 50), (-46.75, 50))
            ThreePointArc((-46.75, 50), (-49.048097039, 49.048097039), (-50, 46.75))
            Line((-50, 46.75), (-50, 41.75))
        make_face()
        with Locations(Location((-46.75, 46.75, 0), (0, 0, 270))):
            Circle(SKETCH11_R, mode=Mode.SUBTRACT)
    # profile 3 of 4: a face of its own
    with BuildSketch(Plane(origin=(0, 60, 0), x_dir=(1, 0, 0), z_dir=(0, 1, 0))):
        with BuildLine():
            Line((46.75, 50), (41.75, 50))
            Line((41.75, 50), (41.75, 46.75))
            ThreePointArc((41.75, 46.75), (43.214466094, 43.214466094), (46.75, 41.75))
            Line((46.75, 41.75), (50, 41.75))
            Line((50, 41.75), (50, 46.75))
            ThreePointArc((50, 46.75), (49.048097039, 49.048097039), (46.75, 50))
        make_face()
        with Locations(Location((46.75, 46.75, 0), (0, 0, 270))):
            Circle(SKETCH11_R, mode=Mode.SUBTRACT)
    # profile 4 of 4: a face of its own
    with BuildSketch(Plane(origin=(0, 60, 0), x_dir=(1, 0, 0), z_dir=(0, 1, 0))):
        with BuildLine():
            Line((41.75, -46.75), (41.75, -50))
            Line((41.75, -50), (46.75, -50))
            ThreePointArc((46.75, -50), (49.048097039, -49.048097039), (50, -46.75))
            Line((50, -46.75), (50, -41.75))
            Line((50, -41.75), (46.75, -41.75))
            ThreePointArc((46.75, -41.75), (43.214466094, -43.214466094), (41.75, -46.75))
        make_face()
        with Locations(Location((46.75, -46.75, 0), (0, 0, 270))):
            Circle(SKETCH11_R, mode=Mode.SUBTRACT)
    extrude(amount=-CUT_EXTRUDE4_DEPTH, mode=Mode.SUBTRACT)

    # Fillet4
    fillet4_edges = [part.edges().sort_by_distance(p)[0] for p in [
        (0, 60, 50),
        (50, 60, 0),
        (0, 60, -50),
        (-50, 60, 0),
        (48.375, 60, 41.75),
        (41.75, 60, 48.375),
        (43.214466094, 60, 43.214466094),
        (43.214466094, 60, -43.214466094),
        (48.375, 60, -41.75),
        (41.75, 60, -48.375),
        (-48.375, 60, -41.75),
        (-41.75, 60, -48.375),
        (-43.214466094, 60, -43.214466094),
        (-43.214466094, 60, 43.214466094),
        (-48.375, 60, 41.75),
        (-41.75, 60, 48.375),
    ]]
    fillet(fillet4_edges, radius=FILLET4_R)

    # Fillet5
    fillet5_edges = [part.edges().sort_by_distance(p)[0] for p in [
        (50, 57.2, 44.25),
        (49.048097039, 57.2, 49.048097039),
        (44.25, 57.2, 50),
        (44.25, 57.2, -50),
        (49.048097039, 57.2, -49.048097039),
        (50, 57.2, -44.25),
        (-50, 57.2, -44.25),
        (-49.048097039, 57.2, -49.048097039),
        (-44.25, 57.2, -50),
        (-44.25, 57.2, 50),
        (-49.048097039, 57.2, 49.048097039),
        (-50, 57.2, 44.25),
    ]]
    fillet(fillet5_edges, radius=FILLET5_R)

    # Sketch12 → Boss-Extrude4 (add)
    with BuildSketch(Plane.XZ.offset(-53.5)):
        Polygon((-45.3, -34.446623382), (-34.446623382, -45.3), (34.446623382, -45.3), (45.3, -34.446623382), (45.3, 34.446623382), (34.446623382, 45.3), (-34.446623382, 45.3), (-45.3, 34.446623382), align=None)
        Polygon((-33.411089476, -42.8), (33.411089476, -42.8), (42.8, -33.411089476), (42.8, 33.411089476), (33.411089476, 42.8), (-33.411089476, 42.8), (-42.8, 33.411089476), (-42.8, -33.411089476), align=None, mode=Mode.SUBTRACT)
    extrude(amount=BOSS_EXTRUDE4_DEPTH)

    # Fillet6
    fillet6_edges = [part.edges().sort_by_distance(p)[0] for p in [
        (0, 53.5, -42.8),
        (38.105544738, 53.5, -38.105544738),
        (42.8, 53.5, 0),
        (38.105544738, 53.5, 38.105544738),
        (0, 53.5, 42.8),
        (-38.105544738, 53.5, 38.105544738),
        (-42.8, 53.5, 0),
        (-38.105544738, 53.5, -38.105544738),
    ]]
    fillet(fillet6_edges, radius=FILLET6_R)

    # Sketch13 → Cut-Extrude5 (cut)
    with BuildSketch(Plane.ZY.offset(45.3)):
        Polygon((-34.446623382, 48.5), (-26.446623382, 50.5), (26.446623382, 50.5), (34.446623382, 48.5), align=None)
    extrude(amount=-CUT_EXTRUDE5_DEPTH, mode=Mode.SUBTRACT)

    # Sketch14 → Cut-Extrude6 (cut)
    with BuildSketch(Plane.XY.offset(45.3)):
        Polygon((-34.446623382, 48.5), (-26.700656689, 50.5), (28.522356043, 50.5), (36.268322735, 48.5), align=None)
    extrude(amount=-CUT_EXTRUDE6_DEPTH, mode=Mode.SUBTRACT)


solid = part.part
